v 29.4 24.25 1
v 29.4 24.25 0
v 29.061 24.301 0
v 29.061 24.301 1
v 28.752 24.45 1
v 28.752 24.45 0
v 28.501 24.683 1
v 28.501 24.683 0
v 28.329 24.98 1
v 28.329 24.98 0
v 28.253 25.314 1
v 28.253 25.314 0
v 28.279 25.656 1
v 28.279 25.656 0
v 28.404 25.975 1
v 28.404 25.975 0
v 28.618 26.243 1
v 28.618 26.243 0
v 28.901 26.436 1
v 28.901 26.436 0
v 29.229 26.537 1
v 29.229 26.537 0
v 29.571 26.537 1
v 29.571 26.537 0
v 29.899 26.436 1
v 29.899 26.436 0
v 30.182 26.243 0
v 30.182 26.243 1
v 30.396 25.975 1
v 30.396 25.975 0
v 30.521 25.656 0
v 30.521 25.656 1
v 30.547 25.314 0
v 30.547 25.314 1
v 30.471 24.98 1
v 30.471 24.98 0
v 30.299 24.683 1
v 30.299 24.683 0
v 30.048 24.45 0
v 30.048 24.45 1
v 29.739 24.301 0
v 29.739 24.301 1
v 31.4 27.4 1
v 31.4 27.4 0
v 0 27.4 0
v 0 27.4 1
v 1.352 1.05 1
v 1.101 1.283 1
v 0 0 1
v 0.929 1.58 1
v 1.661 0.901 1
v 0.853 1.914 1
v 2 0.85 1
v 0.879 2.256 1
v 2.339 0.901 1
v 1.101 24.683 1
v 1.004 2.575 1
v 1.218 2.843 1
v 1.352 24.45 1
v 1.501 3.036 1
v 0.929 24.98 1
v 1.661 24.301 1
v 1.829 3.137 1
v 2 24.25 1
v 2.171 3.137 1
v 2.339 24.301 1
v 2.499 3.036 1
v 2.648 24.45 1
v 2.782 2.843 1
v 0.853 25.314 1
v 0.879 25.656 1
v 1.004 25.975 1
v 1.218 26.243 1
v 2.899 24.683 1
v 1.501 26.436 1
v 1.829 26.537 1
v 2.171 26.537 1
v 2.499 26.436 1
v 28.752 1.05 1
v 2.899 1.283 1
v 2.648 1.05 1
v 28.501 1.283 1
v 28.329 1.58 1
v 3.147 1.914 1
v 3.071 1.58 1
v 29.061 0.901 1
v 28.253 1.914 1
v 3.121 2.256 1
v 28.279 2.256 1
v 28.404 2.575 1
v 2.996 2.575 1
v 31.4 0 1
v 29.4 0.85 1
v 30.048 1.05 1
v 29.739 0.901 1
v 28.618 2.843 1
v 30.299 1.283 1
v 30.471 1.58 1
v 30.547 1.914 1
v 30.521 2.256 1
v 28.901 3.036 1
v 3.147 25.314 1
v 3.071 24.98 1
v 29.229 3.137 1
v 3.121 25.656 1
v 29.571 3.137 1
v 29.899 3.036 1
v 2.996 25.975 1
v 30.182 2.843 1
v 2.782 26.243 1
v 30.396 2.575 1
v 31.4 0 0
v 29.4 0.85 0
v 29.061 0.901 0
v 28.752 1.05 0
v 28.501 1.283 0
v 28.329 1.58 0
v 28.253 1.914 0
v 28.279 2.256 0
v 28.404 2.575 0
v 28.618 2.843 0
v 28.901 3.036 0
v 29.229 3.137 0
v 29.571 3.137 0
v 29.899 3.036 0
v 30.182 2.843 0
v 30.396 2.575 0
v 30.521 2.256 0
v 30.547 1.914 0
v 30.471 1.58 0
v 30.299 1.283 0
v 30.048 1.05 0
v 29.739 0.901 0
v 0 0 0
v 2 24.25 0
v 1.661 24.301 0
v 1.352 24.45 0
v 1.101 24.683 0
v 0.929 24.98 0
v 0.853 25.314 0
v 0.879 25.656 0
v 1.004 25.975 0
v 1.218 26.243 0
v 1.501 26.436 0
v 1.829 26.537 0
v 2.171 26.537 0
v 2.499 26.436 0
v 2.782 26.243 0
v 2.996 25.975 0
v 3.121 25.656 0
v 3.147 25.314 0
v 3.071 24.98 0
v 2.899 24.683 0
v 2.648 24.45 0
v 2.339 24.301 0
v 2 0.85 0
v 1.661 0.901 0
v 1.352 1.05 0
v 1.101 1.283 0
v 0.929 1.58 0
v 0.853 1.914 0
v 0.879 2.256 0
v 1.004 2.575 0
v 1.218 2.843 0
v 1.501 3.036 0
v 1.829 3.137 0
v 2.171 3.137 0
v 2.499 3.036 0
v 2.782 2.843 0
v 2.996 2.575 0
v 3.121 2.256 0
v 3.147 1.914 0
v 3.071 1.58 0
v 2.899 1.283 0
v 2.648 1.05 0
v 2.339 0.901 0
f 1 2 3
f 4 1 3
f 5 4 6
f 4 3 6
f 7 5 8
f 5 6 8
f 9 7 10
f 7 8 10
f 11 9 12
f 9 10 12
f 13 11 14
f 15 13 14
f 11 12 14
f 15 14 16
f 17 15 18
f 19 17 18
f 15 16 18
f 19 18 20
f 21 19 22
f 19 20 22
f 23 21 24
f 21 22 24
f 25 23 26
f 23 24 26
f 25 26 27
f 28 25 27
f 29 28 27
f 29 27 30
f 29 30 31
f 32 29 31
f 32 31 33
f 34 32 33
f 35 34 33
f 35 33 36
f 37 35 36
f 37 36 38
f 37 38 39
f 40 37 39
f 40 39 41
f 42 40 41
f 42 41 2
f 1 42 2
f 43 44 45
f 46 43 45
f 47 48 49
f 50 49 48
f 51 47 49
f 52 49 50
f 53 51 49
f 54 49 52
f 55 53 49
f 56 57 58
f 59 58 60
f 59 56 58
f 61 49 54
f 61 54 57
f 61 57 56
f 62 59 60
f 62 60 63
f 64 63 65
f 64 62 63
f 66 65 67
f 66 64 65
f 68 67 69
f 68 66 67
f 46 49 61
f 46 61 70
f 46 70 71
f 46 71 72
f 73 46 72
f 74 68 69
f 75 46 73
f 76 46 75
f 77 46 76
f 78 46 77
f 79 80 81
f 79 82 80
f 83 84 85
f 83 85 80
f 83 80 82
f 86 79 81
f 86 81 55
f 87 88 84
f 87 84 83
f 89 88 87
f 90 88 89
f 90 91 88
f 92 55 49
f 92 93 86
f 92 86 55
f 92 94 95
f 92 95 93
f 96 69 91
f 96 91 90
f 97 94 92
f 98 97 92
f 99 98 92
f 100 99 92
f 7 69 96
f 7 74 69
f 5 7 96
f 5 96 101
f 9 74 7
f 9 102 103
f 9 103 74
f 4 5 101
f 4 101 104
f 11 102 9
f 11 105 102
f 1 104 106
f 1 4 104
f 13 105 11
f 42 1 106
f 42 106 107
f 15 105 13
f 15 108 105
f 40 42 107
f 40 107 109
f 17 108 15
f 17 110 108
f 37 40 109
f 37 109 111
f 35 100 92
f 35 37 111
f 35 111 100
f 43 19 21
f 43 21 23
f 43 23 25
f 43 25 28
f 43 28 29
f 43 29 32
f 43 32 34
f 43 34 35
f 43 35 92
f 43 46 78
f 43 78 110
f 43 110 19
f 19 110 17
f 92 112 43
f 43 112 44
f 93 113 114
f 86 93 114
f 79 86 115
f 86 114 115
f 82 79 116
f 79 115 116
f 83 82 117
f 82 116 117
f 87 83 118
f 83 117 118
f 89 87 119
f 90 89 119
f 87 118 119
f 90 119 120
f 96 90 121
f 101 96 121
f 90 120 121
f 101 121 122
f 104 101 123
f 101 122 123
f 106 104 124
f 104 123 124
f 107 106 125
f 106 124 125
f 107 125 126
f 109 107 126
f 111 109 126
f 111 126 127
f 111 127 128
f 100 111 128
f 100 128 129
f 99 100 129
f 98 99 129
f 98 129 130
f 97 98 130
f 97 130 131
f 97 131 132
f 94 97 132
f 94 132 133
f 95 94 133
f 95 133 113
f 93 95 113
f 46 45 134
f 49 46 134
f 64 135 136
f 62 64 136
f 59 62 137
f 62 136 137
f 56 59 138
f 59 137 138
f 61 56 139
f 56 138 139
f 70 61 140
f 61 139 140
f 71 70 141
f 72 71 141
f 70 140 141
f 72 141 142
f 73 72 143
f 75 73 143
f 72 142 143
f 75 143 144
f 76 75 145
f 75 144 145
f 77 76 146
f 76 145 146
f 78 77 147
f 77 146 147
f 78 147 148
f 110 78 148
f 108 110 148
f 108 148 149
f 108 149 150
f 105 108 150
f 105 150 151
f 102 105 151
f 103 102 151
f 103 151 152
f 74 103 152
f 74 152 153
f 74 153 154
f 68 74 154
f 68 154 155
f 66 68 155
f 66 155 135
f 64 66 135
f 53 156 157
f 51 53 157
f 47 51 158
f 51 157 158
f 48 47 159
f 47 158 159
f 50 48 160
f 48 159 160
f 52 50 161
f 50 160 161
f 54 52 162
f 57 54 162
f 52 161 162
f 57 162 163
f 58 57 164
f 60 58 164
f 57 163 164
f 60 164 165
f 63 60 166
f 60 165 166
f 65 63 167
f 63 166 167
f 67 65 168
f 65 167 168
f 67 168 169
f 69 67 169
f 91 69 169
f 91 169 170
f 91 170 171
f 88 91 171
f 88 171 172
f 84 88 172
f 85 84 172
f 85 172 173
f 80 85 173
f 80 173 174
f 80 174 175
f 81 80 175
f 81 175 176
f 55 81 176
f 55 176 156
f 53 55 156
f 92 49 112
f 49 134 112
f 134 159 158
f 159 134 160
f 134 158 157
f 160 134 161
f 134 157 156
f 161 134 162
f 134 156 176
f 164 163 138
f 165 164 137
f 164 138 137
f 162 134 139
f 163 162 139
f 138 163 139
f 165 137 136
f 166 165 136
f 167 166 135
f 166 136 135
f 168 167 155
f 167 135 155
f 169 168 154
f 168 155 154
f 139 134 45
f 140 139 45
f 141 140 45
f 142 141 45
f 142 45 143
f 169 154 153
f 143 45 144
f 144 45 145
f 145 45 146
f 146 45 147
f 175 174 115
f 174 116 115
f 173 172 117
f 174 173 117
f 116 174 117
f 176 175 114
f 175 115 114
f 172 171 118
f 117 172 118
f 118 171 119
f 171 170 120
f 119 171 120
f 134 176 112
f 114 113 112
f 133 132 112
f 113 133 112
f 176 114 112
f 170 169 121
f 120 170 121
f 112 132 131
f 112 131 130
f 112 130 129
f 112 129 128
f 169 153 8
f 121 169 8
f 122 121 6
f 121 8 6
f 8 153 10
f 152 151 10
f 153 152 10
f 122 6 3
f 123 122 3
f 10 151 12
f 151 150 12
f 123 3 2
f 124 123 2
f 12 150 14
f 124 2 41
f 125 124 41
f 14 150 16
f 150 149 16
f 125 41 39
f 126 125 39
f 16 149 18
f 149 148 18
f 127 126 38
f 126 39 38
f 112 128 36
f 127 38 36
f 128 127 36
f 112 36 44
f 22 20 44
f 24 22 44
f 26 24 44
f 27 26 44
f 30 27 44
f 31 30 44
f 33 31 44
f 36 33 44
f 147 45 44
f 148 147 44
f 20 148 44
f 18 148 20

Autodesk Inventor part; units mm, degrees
ref_plane "YZ Plane" through (0, 0, 0) normal (1, 0, 0) x (0, 1, 0)
ref_plane "XZ Plane" through (0, 0, 0) normal (0, 1, 0) x (-1, 0, 0)
ref_plane "XY Plane" through (0, 0, 0) normal (0, 0, 1) x (1, 0, 0)
sketch "Sketch1" plane through (0, 0, 0) normal (0, 0, 1) x (1, 0, 0)
  line L0 (0, 0) -> (31.4, 0)
  line L1 (31.4, 0) -> (31.4, 27.4)
  line L2 (31.4, 27.4) -> (0, 27.4)
  line L3 (0, 27.4) -> (0, 0)
  dimension "d0" = 31.4
  dimension "d1" = 27.4
extrude "Extrusion1" add sketch "Sketch1" along normal blind 1
sketch "Sketch17" plane through (0, 0, 1) normal (0, 0, 1) x (1, 0, 0)
  line L0 (2, 25.4) -> (29.4, 25.4) construction
  line L1 (29.4, 25.4) -> (29.4, 2) construction
  line L2 (29.4, 2) -> (2, 2) construction
  line L3 (2, 2) -> (2, 25.4) construction
  line L4 (0, 0) -> (0, 27.4) construction
  line L5 (0, 27.4) -> (31.4, 27.4) construction
  dimension "d169" = 27.4
  dimension "d170" = 23.4
  dimension "d171" = 2
  dimension "d172" = 2
hole "Hole16" at (2, 25.4, 1) at (29.4, 25.4, 1) at (29.4, 2, 1) at (2, 2, 1) direction (0, 0, -1) diameter 2.3 end through all
properties part number "Mixer IQ Box ND20" material "Aluminum-6061"
